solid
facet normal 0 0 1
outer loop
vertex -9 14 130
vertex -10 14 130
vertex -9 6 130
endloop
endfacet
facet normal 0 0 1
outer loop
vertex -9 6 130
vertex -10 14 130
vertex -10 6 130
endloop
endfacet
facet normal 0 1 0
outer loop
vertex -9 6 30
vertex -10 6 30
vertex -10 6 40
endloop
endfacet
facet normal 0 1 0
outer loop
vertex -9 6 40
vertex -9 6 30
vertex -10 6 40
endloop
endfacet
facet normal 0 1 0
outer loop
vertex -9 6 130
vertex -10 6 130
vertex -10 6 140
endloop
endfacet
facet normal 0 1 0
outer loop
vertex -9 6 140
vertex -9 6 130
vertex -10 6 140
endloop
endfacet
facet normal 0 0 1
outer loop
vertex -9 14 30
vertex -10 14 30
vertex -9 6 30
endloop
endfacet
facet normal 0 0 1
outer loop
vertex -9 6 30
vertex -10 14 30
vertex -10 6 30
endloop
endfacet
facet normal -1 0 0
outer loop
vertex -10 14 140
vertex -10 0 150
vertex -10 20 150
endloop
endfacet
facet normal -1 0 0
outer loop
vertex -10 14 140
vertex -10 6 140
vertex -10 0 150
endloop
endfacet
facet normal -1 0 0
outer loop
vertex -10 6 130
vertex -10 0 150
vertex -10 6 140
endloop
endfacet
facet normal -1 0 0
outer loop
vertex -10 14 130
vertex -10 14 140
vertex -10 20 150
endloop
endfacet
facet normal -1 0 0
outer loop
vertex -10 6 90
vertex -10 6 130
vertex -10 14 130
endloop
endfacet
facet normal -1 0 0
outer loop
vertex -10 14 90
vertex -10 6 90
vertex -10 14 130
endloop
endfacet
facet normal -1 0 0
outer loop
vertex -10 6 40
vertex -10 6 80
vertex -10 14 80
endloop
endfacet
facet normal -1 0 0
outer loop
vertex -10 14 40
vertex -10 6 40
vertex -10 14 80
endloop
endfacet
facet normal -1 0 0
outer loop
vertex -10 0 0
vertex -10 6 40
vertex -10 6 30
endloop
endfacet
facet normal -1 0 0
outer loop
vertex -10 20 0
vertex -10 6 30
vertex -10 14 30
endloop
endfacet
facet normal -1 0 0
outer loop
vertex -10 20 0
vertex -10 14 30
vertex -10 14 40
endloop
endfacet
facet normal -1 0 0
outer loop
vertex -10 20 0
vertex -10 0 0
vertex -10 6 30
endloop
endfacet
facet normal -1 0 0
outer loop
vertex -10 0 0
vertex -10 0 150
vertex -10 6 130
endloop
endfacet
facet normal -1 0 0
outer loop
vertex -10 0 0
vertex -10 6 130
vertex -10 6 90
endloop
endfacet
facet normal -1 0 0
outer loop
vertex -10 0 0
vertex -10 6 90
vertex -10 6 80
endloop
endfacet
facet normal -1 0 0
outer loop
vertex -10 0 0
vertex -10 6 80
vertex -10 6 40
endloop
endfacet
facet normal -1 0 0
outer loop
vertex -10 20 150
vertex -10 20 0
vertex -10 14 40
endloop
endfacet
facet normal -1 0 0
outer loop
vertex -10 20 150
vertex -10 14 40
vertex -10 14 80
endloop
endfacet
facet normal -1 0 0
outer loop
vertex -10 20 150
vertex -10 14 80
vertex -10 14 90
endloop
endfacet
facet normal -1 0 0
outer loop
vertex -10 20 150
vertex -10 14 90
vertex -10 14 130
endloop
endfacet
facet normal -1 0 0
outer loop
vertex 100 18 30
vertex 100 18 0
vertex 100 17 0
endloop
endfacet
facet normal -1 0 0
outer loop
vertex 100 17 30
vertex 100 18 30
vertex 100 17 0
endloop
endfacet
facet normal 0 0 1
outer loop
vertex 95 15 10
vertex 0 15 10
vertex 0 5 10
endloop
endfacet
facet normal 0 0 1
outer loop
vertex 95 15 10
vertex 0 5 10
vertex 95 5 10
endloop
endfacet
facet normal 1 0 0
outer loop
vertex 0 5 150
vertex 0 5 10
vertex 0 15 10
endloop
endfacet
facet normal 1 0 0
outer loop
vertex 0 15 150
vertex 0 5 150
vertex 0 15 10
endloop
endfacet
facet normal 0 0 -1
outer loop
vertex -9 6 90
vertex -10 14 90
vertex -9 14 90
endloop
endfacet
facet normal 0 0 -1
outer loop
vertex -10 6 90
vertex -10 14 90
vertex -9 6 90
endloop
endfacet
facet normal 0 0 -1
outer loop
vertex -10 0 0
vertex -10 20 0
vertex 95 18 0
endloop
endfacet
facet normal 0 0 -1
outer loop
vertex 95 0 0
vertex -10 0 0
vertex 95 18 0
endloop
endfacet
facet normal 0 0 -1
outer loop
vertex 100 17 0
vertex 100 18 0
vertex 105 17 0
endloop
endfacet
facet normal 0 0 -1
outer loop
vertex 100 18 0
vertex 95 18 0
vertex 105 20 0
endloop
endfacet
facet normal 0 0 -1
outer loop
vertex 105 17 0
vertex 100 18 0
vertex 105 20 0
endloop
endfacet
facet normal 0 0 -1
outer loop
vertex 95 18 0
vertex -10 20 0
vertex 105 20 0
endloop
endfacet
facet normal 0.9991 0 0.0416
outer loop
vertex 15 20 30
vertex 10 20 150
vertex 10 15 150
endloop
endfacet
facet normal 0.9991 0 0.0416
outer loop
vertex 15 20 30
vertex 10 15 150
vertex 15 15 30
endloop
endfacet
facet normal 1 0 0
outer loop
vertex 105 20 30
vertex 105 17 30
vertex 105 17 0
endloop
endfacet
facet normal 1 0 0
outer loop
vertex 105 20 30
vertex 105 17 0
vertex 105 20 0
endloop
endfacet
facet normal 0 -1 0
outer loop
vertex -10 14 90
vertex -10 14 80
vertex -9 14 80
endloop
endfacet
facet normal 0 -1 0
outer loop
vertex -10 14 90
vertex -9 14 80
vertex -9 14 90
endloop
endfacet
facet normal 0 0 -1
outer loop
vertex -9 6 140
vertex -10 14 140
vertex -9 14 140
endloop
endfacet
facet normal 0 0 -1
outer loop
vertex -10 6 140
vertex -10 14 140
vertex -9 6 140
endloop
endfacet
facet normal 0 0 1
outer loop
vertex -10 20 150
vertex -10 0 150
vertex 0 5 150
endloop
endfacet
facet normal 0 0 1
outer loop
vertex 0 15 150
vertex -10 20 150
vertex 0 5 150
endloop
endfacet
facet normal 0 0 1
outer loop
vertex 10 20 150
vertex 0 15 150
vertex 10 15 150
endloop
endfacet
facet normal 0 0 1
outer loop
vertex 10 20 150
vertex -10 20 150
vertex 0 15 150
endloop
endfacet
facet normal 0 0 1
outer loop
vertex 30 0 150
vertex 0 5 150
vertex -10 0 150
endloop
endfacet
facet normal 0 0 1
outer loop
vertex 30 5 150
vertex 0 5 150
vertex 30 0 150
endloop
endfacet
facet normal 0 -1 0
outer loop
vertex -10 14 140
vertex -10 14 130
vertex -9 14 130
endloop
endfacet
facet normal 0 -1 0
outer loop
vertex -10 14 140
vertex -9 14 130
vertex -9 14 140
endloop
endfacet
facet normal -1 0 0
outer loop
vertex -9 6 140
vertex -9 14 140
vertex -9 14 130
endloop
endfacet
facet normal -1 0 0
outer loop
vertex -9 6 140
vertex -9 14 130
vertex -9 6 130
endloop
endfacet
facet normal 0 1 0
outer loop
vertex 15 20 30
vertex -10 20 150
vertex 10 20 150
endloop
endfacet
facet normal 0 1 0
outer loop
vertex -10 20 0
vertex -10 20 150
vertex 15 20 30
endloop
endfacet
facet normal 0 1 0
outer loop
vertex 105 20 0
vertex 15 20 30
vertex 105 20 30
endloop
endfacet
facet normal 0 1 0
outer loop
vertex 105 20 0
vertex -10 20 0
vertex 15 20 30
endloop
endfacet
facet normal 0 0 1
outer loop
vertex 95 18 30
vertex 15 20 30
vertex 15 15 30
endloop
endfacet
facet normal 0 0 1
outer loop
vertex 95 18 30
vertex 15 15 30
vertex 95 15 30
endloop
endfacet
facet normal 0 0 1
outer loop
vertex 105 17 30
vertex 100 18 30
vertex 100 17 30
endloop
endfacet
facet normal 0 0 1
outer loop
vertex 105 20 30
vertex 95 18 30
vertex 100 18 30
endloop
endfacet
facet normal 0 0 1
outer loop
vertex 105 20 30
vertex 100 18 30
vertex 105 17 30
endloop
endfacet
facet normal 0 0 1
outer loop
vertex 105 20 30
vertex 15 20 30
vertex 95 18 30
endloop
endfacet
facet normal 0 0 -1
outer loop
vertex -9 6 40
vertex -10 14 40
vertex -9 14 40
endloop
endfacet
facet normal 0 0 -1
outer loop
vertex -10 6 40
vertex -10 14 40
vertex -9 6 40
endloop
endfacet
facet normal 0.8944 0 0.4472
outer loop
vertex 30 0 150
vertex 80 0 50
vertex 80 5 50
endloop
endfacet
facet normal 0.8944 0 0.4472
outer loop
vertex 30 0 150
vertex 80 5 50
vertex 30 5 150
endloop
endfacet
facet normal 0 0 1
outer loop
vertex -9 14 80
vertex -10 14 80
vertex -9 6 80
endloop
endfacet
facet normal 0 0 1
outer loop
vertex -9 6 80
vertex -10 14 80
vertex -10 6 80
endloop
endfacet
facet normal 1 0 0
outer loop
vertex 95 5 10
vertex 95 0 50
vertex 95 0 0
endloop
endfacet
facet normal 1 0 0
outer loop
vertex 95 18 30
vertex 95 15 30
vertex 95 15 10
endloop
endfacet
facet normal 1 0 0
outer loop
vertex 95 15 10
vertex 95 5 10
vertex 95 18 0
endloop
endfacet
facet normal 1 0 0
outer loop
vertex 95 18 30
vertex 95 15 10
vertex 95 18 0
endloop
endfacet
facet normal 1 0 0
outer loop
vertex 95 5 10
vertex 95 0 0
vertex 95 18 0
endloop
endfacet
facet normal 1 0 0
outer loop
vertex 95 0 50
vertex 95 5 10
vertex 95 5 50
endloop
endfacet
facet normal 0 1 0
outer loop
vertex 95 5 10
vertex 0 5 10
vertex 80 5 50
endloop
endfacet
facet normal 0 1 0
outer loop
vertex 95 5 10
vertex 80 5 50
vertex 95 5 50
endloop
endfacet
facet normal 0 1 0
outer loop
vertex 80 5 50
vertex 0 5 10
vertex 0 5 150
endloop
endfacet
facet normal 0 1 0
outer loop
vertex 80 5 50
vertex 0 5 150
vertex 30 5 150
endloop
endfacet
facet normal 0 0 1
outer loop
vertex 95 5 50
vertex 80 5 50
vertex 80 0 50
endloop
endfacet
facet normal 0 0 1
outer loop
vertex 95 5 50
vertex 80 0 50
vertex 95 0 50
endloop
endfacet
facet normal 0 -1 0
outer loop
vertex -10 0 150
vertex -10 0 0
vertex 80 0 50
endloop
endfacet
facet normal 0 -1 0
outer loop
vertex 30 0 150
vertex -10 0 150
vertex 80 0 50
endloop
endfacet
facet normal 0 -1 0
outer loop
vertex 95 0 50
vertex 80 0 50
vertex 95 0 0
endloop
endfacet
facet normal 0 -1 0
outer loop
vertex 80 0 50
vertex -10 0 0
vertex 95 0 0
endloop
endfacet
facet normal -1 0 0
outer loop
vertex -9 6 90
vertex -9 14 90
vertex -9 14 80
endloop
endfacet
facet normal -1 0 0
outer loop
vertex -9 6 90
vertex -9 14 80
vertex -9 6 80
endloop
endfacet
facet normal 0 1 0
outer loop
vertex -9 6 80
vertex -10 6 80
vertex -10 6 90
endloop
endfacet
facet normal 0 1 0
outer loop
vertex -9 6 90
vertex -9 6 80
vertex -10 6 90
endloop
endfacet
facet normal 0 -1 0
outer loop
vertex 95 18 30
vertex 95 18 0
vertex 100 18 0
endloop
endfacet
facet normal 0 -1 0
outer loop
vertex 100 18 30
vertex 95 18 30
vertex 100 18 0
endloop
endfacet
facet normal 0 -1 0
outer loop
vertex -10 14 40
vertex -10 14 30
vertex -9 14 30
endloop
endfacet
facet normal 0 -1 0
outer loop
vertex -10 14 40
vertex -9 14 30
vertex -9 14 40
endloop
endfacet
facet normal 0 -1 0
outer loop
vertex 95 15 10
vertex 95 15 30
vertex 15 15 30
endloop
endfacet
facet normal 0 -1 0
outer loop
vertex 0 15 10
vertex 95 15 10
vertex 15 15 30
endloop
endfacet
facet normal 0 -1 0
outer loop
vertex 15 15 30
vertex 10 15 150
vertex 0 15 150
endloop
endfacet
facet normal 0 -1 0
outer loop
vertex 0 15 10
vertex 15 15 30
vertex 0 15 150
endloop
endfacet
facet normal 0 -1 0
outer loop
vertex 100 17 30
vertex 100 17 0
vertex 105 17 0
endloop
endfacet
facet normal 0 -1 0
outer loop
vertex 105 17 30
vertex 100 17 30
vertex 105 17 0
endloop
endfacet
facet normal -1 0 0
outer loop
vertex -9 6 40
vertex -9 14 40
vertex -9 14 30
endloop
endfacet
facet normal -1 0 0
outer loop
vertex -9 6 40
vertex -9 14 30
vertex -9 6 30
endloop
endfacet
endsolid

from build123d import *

# Parameters (mm, degrees)
F0_W      = 95
F0_H      = 5
F1_DEPTH  = 50
F2_W      = 95
F2_H      = 10
F3_DEPTH  = 10
F4_W      = 5
F4_H      = 2
F5_DEPTH  = 30
F6_W      = 10
F6_H      = 120
F7_DEPTH  = 5
F8_W      = 30
F8_H      = 100
F9_DEPTH  = 5
F10_W     = 10
F10_H     = 20
F11_DEPTH = 150
F12_W     = 8
F12_H     = 10
F13_DEPTH = 1


with BuildPart() as f1:
    # F0 (on Top) → F1 (new body)
    with BuildSketch(Plane.XY):
        with Locations((47.5, 2.5)):
            Rectangle(F0_W, F0_H)
    extrude(amount=F1_DEPTH)

    # F2 (on Top) → F3 (join)
    with BuildSketch(Plane.XY):
        with Locations((47.5, 10)):
            Rectangle(F2_W, F2_H)
    extrude(amount=F3_DEPTH)

    # F4 (on Top) → F5 (join)
    with BuildSketch(Plane.XY):
        Polygon((0, 20), (0, 15), (95, 15), (95, 18), (95, 20), align=None)
        with Locations((97.5, 19)):
            Rectangle(F4_W, F4_H)
        Polygon((100, 20), (100, 18), (100, 17), (105, 17), (105, 20), align=None)
    extrude(amount=F5_DEPTH)

    # F6 (on face) → F7 (join)
    with BuildSketch(Plane(origin=(0, 20, 0), x_dir=(-1, 0, 0), z_dir=(0, 1, 0))):
        with Locations((-5, 90)):
            Rectangle(F6_W, F6_H)
        Polygon((-15, 30), (-10, 30), (-10, 150), align=None)
    extrude(amount=-F7_DEPTH)

    # F8 (on face) → F9 (join)
    with BuildSketch(Plane.XZ):
        with Locations((15, 100)):
            Rectangle(F8_W, F8_H)
        Polygon((30, 150), (30, 50), (80, 50), align=None)
    extrude(amount=-F9_DEPTH)

    # F10 (on Top) → F11 (join)
    with BuildSketch(Plane.XY):
        with Locations((-5, 10)):
            Rectangle(F10_W, F10_H)
    extrude(amount=F11_DEPTH)

    # F12 (on face) → F13 (cut)
    with BuildSketch(Plane(origin=(-10, 0, 0), x_dir=(0, -1, 0), z_dir=(-1, 0, 0))):
        with Locations((-10, 135)):
            Rectangle(F12_W, F12_H)
        with Locations((-10, 85)):
            Rectangle(F12_W, F12_H)
        with Locations((-10, 35)):
            Rectangle(F12_W, F12_H)
    extrude(amount=-F13_DEPTH, mode=Mode.SUBTRACT)


solid = f1.part
